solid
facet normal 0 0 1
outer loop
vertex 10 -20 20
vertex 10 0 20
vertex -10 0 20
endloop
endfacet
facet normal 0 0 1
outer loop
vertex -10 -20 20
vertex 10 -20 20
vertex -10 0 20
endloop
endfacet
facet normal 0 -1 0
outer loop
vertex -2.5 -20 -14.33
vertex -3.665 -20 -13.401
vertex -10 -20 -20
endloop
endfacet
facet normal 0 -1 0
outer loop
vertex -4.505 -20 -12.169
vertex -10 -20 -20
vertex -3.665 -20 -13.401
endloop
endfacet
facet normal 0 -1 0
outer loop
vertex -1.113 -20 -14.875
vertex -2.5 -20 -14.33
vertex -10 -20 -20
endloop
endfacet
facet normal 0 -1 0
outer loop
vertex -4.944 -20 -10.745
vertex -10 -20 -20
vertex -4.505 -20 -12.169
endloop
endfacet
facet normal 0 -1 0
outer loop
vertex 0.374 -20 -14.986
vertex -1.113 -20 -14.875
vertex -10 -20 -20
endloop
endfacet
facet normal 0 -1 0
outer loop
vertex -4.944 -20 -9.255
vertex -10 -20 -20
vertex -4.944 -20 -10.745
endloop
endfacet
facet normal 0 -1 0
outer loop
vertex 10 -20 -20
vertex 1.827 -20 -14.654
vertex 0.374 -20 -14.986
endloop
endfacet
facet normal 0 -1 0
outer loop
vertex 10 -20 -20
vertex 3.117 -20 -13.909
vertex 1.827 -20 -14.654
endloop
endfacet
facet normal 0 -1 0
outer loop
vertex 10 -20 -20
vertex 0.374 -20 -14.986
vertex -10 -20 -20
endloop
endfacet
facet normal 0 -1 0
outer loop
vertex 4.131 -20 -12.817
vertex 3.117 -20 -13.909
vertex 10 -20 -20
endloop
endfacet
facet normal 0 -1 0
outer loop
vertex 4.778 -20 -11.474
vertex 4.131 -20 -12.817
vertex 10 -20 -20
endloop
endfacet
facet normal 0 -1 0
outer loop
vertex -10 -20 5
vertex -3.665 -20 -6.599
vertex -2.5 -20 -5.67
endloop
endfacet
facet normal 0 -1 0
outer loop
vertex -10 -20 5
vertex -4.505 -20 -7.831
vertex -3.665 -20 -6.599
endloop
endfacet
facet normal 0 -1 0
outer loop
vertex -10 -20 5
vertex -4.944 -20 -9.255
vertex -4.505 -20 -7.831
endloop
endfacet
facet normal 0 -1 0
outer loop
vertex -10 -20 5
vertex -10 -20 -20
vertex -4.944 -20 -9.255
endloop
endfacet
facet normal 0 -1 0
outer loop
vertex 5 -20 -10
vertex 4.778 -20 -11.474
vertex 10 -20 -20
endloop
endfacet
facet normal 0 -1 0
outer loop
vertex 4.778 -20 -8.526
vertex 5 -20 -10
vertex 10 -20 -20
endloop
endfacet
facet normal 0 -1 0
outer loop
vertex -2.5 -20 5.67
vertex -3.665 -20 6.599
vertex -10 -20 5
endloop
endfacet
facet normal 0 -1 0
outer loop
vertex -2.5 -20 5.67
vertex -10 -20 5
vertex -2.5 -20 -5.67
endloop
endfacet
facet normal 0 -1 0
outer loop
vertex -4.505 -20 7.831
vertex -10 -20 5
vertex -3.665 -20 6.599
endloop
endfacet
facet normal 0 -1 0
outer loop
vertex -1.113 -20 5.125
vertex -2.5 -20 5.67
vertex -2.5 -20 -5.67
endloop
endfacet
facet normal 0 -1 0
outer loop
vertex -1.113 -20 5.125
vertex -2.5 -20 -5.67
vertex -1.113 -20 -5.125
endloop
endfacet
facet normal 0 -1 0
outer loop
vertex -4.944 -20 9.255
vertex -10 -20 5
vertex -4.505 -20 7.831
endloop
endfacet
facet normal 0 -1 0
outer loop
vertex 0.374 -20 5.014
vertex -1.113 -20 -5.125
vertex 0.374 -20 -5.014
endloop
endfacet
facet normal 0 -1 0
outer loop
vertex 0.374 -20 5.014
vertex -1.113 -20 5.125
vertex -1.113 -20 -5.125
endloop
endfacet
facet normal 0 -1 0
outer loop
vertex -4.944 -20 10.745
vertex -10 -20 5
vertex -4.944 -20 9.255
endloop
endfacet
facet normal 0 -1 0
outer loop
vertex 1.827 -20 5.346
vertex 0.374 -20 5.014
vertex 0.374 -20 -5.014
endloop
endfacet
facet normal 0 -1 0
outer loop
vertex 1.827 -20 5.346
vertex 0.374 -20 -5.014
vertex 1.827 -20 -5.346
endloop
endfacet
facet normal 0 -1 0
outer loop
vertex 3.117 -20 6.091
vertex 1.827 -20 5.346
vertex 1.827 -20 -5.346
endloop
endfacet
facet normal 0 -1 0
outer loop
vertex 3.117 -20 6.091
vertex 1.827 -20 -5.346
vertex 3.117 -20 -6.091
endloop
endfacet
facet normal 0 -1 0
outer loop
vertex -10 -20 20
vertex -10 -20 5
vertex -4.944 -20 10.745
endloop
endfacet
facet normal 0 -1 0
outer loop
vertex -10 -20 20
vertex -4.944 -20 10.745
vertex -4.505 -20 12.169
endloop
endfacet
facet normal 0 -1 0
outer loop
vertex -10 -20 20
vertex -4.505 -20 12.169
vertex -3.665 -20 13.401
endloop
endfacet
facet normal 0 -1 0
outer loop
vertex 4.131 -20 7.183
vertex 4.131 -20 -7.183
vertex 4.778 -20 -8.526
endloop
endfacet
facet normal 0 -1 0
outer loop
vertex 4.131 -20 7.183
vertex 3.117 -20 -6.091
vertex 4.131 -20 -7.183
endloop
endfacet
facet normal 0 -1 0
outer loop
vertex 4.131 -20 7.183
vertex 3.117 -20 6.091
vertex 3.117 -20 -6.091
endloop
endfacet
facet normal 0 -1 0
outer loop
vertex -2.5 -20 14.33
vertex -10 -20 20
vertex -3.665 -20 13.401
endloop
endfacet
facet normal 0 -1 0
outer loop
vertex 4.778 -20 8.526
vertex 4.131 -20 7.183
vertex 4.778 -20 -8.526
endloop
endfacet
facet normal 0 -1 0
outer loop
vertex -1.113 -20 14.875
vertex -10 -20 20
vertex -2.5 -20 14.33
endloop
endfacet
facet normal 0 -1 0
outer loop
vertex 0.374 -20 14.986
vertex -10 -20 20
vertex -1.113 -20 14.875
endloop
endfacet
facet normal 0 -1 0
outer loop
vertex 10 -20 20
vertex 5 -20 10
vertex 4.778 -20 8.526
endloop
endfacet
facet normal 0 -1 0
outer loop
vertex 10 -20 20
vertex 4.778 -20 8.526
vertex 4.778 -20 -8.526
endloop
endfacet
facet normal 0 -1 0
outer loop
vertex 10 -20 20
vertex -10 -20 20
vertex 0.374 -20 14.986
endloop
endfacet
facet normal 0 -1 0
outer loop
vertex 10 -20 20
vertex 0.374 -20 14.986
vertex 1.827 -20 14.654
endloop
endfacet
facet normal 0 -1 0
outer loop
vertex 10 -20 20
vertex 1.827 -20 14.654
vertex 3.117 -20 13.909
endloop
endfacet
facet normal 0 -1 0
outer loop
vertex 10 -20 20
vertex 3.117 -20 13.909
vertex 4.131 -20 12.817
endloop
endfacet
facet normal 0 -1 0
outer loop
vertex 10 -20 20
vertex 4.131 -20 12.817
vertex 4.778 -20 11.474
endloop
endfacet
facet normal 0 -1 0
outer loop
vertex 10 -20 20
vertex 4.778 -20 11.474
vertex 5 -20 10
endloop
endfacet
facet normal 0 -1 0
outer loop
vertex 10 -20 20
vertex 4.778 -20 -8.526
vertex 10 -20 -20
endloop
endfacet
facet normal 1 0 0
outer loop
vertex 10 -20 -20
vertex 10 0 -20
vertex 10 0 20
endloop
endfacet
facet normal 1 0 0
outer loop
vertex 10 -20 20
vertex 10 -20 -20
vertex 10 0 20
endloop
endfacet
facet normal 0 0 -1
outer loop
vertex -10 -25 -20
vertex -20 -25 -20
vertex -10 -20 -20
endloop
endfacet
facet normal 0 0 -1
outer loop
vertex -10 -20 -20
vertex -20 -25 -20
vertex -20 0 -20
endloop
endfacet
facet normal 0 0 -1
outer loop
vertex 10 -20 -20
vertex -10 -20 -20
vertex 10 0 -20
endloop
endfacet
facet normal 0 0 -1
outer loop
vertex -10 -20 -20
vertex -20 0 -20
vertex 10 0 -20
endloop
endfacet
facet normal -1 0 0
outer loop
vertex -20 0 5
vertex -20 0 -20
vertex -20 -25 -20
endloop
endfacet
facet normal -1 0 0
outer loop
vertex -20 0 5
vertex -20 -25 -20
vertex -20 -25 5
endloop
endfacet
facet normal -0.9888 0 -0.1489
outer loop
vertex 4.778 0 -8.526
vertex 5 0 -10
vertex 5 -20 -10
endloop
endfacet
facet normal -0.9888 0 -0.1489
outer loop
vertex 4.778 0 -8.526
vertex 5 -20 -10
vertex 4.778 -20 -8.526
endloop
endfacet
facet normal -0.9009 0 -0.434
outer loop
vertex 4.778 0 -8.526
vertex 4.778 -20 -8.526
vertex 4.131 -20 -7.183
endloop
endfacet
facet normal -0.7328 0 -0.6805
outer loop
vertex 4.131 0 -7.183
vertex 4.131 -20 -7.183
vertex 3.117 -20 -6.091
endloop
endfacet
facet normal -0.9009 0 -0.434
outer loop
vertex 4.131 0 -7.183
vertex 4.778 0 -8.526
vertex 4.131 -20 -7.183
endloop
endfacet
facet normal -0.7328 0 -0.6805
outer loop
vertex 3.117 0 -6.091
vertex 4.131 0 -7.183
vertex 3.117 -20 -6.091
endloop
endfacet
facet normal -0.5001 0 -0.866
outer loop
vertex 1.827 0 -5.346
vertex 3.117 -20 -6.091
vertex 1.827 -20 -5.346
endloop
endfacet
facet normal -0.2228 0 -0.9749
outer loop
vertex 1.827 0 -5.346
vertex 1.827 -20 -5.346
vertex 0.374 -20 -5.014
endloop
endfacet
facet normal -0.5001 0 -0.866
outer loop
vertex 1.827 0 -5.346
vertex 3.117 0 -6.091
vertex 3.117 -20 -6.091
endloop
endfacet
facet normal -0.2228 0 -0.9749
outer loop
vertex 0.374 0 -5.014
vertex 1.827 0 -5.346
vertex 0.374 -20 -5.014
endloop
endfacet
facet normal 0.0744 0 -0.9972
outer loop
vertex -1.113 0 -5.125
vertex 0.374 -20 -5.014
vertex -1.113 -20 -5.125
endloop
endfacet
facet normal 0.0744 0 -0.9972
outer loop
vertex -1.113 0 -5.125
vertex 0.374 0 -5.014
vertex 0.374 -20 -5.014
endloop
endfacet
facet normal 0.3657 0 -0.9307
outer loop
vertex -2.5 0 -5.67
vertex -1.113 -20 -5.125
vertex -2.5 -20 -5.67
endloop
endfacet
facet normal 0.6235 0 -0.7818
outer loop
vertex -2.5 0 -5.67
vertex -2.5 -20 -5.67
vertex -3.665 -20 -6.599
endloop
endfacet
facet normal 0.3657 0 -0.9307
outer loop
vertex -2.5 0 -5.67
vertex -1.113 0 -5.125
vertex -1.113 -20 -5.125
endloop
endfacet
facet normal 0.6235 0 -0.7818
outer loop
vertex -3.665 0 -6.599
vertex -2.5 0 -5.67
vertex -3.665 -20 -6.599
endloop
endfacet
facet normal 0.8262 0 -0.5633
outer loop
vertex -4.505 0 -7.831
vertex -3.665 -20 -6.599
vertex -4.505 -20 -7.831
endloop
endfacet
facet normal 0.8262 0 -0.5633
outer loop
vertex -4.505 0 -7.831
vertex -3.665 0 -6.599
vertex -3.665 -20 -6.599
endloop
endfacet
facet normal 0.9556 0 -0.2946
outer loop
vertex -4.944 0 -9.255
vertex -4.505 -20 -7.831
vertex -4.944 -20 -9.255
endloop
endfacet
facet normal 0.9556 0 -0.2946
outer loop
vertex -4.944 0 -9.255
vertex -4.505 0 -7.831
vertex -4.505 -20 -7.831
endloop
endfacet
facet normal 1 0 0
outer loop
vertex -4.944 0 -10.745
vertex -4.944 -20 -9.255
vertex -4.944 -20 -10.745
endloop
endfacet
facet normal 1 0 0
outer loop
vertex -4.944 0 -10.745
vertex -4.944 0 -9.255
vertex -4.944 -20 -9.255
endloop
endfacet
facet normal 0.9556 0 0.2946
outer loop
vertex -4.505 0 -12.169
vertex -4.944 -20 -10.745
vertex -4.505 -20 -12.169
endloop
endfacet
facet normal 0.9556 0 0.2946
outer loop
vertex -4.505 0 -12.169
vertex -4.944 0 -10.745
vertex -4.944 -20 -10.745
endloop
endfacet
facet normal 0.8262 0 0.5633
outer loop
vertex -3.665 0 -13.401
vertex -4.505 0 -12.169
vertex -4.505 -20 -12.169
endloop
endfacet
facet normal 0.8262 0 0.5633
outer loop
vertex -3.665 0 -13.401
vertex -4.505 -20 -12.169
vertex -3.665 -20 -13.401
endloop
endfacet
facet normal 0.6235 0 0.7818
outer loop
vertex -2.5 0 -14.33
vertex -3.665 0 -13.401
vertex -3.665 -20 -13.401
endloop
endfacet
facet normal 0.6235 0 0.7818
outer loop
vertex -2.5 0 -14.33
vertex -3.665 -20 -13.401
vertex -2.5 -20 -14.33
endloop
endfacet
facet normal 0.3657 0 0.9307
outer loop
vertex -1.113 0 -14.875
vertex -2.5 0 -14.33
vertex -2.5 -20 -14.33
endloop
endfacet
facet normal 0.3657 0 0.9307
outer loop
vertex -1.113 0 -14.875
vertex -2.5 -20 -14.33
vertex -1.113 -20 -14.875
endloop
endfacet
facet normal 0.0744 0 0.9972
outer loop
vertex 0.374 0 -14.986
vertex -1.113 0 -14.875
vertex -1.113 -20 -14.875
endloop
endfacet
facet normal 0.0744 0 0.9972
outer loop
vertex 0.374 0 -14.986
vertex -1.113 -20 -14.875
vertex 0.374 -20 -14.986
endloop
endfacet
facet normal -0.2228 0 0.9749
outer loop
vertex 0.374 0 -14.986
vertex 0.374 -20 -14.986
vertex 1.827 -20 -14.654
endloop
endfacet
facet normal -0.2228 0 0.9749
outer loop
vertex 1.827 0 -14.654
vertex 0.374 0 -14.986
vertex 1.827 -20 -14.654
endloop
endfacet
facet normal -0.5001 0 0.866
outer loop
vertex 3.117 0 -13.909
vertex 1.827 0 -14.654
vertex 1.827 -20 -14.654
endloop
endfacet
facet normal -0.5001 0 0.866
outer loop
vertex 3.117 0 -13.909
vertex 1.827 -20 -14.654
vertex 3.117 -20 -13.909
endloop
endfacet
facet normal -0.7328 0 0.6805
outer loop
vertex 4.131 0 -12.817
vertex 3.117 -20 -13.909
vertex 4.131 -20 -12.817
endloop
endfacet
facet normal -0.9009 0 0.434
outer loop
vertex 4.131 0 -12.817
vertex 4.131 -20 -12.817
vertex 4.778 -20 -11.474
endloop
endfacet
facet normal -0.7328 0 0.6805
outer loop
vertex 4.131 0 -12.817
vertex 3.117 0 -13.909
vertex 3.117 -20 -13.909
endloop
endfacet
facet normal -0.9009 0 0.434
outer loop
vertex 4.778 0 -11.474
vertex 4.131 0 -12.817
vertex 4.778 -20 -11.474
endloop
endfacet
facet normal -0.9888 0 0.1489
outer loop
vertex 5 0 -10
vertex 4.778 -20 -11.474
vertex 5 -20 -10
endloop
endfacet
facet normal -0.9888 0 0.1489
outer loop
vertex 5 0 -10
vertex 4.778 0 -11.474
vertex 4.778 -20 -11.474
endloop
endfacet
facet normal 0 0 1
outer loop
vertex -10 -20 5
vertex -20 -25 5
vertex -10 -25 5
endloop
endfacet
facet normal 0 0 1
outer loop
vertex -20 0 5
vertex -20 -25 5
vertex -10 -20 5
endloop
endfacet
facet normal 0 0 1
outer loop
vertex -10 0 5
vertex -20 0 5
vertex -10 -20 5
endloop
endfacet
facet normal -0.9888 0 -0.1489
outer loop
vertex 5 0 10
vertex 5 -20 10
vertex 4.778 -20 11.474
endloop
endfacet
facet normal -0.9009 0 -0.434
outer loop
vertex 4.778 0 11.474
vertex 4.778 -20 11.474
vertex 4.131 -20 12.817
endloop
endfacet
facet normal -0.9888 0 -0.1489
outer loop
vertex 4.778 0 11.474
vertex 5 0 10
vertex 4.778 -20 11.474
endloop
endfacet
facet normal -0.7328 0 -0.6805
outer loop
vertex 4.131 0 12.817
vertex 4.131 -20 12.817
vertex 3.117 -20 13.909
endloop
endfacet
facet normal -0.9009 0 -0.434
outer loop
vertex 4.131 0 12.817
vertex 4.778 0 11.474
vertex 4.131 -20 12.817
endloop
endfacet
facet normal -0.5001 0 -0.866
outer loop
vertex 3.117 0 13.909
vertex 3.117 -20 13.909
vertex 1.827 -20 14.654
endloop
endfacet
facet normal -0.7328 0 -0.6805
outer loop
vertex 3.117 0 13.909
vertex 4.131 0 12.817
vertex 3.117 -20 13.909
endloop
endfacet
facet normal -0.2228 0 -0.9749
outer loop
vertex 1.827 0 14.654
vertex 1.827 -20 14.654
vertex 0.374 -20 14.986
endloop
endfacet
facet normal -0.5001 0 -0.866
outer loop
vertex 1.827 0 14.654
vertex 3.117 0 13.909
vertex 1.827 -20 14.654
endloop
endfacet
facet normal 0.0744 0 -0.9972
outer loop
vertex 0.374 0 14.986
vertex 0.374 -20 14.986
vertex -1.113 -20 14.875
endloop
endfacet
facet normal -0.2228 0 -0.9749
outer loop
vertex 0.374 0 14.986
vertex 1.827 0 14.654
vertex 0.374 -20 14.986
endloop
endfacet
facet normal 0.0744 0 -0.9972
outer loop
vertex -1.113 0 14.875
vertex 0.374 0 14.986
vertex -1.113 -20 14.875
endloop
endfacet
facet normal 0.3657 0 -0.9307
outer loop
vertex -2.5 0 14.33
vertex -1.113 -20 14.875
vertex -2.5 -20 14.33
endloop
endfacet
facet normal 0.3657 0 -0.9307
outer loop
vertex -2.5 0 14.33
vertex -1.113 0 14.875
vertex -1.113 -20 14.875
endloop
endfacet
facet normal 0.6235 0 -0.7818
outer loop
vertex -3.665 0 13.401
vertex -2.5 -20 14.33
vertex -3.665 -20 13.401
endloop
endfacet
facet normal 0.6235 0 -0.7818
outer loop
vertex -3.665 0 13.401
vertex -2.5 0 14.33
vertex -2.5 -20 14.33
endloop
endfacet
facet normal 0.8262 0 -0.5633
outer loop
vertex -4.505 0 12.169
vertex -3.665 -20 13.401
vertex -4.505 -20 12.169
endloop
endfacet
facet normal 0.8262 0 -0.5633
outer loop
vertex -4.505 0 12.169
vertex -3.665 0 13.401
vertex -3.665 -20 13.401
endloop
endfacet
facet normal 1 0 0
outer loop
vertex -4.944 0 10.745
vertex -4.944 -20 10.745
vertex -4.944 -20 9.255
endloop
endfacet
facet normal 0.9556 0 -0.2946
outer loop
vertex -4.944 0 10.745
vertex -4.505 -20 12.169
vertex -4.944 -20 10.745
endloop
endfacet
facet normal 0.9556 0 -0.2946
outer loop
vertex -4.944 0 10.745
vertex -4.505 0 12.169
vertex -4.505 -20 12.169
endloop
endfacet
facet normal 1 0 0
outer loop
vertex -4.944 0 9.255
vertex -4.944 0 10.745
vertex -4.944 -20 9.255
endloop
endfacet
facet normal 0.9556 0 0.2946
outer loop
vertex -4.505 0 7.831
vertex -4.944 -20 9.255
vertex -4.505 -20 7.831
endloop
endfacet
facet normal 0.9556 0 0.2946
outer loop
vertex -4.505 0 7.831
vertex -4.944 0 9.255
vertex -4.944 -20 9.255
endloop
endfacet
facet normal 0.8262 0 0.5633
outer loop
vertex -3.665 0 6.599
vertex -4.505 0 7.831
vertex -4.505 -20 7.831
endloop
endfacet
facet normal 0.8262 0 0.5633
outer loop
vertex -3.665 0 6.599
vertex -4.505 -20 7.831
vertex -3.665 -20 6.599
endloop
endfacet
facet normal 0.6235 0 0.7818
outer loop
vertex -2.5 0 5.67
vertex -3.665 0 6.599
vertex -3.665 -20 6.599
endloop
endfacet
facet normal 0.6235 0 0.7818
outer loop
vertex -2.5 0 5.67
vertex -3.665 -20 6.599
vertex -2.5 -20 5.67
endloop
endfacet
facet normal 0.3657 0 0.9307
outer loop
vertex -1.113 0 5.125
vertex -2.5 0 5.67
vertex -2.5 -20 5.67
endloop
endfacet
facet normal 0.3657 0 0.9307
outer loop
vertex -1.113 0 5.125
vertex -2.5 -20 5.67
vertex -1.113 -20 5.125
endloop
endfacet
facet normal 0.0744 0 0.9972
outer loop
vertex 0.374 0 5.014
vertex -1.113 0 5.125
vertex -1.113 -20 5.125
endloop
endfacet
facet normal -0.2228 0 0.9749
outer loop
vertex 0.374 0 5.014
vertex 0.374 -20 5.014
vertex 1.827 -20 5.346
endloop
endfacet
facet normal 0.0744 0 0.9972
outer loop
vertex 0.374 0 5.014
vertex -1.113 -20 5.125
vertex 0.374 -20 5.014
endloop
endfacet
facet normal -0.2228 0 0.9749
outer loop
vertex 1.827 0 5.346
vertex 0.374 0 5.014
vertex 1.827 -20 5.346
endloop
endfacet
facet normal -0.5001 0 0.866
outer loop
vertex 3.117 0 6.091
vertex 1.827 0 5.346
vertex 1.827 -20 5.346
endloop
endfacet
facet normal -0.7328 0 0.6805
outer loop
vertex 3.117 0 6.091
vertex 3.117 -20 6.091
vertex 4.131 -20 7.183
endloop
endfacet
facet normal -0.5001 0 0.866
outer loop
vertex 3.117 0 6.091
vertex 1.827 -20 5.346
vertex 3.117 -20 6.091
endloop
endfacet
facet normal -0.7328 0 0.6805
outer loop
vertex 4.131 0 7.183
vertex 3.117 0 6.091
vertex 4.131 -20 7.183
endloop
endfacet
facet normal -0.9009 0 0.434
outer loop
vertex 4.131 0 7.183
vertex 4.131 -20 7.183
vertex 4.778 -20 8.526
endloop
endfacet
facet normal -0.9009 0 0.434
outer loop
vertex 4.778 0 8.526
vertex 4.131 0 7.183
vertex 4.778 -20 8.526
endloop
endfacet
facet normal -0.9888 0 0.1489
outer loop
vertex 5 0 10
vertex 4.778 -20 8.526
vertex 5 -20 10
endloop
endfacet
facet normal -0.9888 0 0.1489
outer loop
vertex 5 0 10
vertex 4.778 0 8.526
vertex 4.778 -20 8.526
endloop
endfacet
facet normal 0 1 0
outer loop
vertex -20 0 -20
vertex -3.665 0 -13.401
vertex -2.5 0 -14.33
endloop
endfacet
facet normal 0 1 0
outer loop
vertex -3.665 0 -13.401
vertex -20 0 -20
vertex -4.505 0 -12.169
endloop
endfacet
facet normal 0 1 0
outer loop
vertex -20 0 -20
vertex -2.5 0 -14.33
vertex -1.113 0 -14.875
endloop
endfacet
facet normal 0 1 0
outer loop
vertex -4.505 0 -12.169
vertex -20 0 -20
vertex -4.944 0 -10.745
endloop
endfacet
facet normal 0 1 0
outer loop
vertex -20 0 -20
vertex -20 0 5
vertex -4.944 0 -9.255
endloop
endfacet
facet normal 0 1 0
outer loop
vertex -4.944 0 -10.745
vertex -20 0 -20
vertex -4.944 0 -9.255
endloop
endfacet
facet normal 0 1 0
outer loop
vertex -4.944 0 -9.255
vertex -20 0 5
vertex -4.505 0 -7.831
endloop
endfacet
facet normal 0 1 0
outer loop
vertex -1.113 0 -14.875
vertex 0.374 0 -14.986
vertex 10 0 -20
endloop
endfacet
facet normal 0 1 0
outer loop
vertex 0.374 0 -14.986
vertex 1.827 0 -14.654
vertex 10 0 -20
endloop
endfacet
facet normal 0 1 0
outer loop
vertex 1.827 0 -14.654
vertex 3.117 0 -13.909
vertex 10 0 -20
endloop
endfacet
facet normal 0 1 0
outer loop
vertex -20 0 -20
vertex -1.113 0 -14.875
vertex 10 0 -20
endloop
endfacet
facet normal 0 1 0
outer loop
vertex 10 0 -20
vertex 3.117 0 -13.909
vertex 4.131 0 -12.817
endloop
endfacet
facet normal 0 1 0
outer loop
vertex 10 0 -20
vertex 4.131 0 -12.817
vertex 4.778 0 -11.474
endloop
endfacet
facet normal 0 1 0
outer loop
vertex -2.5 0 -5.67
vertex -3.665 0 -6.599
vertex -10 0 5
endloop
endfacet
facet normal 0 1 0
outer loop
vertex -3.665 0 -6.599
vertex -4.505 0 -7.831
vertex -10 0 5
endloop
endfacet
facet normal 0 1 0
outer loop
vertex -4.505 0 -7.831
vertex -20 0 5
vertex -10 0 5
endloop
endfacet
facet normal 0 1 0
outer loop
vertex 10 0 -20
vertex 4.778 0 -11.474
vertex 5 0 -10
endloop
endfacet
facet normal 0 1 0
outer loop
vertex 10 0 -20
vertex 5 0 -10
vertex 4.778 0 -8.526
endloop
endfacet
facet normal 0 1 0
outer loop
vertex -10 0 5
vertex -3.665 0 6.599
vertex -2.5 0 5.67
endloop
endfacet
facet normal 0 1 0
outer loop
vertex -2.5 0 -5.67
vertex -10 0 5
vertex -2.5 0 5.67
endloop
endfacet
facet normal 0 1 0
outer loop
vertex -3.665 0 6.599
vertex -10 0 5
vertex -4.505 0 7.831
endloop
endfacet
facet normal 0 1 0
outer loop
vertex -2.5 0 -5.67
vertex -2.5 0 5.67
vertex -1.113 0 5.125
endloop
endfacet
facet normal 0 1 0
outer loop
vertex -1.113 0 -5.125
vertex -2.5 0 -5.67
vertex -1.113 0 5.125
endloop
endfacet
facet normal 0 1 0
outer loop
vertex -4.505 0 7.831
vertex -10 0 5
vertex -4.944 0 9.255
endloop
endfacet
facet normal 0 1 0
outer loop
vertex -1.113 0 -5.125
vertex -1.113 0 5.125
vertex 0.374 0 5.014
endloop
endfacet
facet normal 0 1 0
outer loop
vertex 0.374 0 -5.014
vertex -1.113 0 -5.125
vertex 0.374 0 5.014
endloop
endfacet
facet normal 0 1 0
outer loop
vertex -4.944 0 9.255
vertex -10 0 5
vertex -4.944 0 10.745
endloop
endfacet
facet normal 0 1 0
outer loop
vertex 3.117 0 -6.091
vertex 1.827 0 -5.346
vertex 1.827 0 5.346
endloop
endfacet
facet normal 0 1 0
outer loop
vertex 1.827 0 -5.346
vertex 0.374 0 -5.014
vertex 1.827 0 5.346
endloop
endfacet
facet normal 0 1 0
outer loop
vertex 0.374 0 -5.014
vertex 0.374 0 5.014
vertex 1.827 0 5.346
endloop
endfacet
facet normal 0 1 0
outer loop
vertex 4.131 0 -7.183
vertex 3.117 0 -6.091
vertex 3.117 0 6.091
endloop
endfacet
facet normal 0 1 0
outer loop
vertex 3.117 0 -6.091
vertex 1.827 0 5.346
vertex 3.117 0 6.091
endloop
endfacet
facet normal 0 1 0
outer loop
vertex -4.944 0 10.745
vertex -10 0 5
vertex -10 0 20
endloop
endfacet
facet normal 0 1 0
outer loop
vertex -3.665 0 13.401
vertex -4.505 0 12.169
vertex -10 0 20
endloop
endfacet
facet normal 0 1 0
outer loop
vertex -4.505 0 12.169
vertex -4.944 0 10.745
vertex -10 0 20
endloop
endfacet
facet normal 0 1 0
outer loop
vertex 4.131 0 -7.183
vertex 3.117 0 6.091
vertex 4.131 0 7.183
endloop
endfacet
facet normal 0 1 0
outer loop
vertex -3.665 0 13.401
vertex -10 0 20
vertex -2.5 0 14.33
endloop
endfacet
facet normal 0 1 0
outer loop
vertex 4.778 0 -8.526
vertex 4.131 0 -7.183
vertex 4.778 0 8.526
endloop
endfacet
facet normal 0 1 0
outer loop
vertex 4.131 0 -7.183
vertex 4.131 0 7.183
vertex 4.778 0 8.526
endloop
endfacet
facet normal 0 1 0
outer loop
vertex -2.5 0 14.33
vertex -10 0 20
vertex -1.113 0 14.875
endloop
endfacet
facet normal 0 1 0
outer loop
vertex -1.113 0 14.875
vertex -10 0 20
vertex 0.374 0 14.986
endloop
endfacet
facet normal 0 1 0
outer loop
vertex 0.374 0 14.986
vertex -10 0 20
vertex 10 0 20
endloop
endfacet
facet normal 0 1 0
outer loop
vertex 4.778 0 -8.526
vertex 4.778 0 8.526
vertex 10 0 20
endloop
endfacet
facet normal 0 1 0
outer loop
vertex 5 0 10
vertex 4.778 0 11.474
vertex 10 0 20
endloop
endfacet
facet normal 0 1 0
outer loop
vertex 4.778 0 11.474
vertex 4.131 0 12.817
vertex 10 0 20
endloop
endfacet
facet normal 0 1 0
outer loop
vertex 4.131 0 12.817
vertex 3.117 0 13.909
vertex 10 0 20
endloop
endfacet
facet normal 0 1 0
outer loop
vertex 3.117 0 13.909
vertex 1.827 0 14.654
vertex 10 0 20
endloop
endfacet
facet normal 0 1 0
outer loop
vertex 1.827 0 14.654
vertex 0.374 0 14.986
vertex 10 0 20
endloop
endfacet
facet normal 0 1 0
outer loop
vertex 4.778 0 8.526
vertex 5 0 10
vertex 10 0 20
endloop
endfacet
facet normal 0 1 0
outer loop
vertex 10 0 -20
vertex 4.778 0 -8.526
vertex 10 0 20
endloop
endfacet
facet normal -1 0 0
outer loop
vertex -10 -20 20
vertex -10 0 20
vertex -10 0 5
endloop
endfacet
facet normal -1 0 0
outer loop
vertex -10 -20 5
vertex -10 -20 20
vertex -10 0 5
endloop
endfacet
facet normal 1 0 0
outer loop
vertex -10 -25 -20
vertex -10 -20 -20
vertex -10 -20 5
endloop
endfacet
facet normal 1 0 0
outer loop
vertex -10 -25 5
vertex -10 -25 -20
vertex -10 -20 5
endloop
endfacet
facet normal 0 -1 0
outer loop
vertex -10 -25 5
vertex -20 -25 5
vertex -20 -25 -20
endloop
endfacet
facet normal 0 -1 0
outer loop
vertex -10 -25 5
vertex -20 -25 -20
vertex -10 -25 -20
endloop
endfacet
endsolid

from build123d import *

# Parameters (mm, degrees)
F0_W      = 10
F0_H      = 25
F1_DEPTH  = 5
F0_R      = 5
F1_FACE_W = 10
F1_FACE_H = 25
F2_DEPTH  = 20
F3_R      = 5
F4_DEPTH  = 68.9


with BuildPart() as f1:
    # F0 (on Front) → F1 (new body)
    with BuildSketch(Plane.XZ):
        with Locations((-15, -7.5)):
            Rectangle(F0_W, F0_H)
    extrude(amount=F1_DEPTH)

    # F0 (on Front) + F1_face (on face) → F2 (join)
    with BuildSketch(Plane.XZ):
        Polygon((10, -20), (10, 20), (-10, 20), (-10, 5), (-10, -20), align=None)
        with Locations((0, -10)):
            Circle(F0_R, mode=Mode.SUBTRACT)
        with Locations((-15, -7.5)):
            Rectangle(F0_W, F0_H)
    with BuildSketch(Plane(origin=(-15, -5, -7.5), x_dir=(1, 0, 0), z_dir=(0, -1, 0))):
        Rectangle(F1_FACE_W, F1_FACE_H)
    extrude(amount=F2_DEPTH)

    # F3 (on Front) → F4 (cut)
    with BuildSketch(Plane.XZ):
        with Locations((0, 10)):
            Circle(F3_R)
    extrude(amount=F4_DEPTH, mode=Mode.SUBTRACT)


solid = f1.part
